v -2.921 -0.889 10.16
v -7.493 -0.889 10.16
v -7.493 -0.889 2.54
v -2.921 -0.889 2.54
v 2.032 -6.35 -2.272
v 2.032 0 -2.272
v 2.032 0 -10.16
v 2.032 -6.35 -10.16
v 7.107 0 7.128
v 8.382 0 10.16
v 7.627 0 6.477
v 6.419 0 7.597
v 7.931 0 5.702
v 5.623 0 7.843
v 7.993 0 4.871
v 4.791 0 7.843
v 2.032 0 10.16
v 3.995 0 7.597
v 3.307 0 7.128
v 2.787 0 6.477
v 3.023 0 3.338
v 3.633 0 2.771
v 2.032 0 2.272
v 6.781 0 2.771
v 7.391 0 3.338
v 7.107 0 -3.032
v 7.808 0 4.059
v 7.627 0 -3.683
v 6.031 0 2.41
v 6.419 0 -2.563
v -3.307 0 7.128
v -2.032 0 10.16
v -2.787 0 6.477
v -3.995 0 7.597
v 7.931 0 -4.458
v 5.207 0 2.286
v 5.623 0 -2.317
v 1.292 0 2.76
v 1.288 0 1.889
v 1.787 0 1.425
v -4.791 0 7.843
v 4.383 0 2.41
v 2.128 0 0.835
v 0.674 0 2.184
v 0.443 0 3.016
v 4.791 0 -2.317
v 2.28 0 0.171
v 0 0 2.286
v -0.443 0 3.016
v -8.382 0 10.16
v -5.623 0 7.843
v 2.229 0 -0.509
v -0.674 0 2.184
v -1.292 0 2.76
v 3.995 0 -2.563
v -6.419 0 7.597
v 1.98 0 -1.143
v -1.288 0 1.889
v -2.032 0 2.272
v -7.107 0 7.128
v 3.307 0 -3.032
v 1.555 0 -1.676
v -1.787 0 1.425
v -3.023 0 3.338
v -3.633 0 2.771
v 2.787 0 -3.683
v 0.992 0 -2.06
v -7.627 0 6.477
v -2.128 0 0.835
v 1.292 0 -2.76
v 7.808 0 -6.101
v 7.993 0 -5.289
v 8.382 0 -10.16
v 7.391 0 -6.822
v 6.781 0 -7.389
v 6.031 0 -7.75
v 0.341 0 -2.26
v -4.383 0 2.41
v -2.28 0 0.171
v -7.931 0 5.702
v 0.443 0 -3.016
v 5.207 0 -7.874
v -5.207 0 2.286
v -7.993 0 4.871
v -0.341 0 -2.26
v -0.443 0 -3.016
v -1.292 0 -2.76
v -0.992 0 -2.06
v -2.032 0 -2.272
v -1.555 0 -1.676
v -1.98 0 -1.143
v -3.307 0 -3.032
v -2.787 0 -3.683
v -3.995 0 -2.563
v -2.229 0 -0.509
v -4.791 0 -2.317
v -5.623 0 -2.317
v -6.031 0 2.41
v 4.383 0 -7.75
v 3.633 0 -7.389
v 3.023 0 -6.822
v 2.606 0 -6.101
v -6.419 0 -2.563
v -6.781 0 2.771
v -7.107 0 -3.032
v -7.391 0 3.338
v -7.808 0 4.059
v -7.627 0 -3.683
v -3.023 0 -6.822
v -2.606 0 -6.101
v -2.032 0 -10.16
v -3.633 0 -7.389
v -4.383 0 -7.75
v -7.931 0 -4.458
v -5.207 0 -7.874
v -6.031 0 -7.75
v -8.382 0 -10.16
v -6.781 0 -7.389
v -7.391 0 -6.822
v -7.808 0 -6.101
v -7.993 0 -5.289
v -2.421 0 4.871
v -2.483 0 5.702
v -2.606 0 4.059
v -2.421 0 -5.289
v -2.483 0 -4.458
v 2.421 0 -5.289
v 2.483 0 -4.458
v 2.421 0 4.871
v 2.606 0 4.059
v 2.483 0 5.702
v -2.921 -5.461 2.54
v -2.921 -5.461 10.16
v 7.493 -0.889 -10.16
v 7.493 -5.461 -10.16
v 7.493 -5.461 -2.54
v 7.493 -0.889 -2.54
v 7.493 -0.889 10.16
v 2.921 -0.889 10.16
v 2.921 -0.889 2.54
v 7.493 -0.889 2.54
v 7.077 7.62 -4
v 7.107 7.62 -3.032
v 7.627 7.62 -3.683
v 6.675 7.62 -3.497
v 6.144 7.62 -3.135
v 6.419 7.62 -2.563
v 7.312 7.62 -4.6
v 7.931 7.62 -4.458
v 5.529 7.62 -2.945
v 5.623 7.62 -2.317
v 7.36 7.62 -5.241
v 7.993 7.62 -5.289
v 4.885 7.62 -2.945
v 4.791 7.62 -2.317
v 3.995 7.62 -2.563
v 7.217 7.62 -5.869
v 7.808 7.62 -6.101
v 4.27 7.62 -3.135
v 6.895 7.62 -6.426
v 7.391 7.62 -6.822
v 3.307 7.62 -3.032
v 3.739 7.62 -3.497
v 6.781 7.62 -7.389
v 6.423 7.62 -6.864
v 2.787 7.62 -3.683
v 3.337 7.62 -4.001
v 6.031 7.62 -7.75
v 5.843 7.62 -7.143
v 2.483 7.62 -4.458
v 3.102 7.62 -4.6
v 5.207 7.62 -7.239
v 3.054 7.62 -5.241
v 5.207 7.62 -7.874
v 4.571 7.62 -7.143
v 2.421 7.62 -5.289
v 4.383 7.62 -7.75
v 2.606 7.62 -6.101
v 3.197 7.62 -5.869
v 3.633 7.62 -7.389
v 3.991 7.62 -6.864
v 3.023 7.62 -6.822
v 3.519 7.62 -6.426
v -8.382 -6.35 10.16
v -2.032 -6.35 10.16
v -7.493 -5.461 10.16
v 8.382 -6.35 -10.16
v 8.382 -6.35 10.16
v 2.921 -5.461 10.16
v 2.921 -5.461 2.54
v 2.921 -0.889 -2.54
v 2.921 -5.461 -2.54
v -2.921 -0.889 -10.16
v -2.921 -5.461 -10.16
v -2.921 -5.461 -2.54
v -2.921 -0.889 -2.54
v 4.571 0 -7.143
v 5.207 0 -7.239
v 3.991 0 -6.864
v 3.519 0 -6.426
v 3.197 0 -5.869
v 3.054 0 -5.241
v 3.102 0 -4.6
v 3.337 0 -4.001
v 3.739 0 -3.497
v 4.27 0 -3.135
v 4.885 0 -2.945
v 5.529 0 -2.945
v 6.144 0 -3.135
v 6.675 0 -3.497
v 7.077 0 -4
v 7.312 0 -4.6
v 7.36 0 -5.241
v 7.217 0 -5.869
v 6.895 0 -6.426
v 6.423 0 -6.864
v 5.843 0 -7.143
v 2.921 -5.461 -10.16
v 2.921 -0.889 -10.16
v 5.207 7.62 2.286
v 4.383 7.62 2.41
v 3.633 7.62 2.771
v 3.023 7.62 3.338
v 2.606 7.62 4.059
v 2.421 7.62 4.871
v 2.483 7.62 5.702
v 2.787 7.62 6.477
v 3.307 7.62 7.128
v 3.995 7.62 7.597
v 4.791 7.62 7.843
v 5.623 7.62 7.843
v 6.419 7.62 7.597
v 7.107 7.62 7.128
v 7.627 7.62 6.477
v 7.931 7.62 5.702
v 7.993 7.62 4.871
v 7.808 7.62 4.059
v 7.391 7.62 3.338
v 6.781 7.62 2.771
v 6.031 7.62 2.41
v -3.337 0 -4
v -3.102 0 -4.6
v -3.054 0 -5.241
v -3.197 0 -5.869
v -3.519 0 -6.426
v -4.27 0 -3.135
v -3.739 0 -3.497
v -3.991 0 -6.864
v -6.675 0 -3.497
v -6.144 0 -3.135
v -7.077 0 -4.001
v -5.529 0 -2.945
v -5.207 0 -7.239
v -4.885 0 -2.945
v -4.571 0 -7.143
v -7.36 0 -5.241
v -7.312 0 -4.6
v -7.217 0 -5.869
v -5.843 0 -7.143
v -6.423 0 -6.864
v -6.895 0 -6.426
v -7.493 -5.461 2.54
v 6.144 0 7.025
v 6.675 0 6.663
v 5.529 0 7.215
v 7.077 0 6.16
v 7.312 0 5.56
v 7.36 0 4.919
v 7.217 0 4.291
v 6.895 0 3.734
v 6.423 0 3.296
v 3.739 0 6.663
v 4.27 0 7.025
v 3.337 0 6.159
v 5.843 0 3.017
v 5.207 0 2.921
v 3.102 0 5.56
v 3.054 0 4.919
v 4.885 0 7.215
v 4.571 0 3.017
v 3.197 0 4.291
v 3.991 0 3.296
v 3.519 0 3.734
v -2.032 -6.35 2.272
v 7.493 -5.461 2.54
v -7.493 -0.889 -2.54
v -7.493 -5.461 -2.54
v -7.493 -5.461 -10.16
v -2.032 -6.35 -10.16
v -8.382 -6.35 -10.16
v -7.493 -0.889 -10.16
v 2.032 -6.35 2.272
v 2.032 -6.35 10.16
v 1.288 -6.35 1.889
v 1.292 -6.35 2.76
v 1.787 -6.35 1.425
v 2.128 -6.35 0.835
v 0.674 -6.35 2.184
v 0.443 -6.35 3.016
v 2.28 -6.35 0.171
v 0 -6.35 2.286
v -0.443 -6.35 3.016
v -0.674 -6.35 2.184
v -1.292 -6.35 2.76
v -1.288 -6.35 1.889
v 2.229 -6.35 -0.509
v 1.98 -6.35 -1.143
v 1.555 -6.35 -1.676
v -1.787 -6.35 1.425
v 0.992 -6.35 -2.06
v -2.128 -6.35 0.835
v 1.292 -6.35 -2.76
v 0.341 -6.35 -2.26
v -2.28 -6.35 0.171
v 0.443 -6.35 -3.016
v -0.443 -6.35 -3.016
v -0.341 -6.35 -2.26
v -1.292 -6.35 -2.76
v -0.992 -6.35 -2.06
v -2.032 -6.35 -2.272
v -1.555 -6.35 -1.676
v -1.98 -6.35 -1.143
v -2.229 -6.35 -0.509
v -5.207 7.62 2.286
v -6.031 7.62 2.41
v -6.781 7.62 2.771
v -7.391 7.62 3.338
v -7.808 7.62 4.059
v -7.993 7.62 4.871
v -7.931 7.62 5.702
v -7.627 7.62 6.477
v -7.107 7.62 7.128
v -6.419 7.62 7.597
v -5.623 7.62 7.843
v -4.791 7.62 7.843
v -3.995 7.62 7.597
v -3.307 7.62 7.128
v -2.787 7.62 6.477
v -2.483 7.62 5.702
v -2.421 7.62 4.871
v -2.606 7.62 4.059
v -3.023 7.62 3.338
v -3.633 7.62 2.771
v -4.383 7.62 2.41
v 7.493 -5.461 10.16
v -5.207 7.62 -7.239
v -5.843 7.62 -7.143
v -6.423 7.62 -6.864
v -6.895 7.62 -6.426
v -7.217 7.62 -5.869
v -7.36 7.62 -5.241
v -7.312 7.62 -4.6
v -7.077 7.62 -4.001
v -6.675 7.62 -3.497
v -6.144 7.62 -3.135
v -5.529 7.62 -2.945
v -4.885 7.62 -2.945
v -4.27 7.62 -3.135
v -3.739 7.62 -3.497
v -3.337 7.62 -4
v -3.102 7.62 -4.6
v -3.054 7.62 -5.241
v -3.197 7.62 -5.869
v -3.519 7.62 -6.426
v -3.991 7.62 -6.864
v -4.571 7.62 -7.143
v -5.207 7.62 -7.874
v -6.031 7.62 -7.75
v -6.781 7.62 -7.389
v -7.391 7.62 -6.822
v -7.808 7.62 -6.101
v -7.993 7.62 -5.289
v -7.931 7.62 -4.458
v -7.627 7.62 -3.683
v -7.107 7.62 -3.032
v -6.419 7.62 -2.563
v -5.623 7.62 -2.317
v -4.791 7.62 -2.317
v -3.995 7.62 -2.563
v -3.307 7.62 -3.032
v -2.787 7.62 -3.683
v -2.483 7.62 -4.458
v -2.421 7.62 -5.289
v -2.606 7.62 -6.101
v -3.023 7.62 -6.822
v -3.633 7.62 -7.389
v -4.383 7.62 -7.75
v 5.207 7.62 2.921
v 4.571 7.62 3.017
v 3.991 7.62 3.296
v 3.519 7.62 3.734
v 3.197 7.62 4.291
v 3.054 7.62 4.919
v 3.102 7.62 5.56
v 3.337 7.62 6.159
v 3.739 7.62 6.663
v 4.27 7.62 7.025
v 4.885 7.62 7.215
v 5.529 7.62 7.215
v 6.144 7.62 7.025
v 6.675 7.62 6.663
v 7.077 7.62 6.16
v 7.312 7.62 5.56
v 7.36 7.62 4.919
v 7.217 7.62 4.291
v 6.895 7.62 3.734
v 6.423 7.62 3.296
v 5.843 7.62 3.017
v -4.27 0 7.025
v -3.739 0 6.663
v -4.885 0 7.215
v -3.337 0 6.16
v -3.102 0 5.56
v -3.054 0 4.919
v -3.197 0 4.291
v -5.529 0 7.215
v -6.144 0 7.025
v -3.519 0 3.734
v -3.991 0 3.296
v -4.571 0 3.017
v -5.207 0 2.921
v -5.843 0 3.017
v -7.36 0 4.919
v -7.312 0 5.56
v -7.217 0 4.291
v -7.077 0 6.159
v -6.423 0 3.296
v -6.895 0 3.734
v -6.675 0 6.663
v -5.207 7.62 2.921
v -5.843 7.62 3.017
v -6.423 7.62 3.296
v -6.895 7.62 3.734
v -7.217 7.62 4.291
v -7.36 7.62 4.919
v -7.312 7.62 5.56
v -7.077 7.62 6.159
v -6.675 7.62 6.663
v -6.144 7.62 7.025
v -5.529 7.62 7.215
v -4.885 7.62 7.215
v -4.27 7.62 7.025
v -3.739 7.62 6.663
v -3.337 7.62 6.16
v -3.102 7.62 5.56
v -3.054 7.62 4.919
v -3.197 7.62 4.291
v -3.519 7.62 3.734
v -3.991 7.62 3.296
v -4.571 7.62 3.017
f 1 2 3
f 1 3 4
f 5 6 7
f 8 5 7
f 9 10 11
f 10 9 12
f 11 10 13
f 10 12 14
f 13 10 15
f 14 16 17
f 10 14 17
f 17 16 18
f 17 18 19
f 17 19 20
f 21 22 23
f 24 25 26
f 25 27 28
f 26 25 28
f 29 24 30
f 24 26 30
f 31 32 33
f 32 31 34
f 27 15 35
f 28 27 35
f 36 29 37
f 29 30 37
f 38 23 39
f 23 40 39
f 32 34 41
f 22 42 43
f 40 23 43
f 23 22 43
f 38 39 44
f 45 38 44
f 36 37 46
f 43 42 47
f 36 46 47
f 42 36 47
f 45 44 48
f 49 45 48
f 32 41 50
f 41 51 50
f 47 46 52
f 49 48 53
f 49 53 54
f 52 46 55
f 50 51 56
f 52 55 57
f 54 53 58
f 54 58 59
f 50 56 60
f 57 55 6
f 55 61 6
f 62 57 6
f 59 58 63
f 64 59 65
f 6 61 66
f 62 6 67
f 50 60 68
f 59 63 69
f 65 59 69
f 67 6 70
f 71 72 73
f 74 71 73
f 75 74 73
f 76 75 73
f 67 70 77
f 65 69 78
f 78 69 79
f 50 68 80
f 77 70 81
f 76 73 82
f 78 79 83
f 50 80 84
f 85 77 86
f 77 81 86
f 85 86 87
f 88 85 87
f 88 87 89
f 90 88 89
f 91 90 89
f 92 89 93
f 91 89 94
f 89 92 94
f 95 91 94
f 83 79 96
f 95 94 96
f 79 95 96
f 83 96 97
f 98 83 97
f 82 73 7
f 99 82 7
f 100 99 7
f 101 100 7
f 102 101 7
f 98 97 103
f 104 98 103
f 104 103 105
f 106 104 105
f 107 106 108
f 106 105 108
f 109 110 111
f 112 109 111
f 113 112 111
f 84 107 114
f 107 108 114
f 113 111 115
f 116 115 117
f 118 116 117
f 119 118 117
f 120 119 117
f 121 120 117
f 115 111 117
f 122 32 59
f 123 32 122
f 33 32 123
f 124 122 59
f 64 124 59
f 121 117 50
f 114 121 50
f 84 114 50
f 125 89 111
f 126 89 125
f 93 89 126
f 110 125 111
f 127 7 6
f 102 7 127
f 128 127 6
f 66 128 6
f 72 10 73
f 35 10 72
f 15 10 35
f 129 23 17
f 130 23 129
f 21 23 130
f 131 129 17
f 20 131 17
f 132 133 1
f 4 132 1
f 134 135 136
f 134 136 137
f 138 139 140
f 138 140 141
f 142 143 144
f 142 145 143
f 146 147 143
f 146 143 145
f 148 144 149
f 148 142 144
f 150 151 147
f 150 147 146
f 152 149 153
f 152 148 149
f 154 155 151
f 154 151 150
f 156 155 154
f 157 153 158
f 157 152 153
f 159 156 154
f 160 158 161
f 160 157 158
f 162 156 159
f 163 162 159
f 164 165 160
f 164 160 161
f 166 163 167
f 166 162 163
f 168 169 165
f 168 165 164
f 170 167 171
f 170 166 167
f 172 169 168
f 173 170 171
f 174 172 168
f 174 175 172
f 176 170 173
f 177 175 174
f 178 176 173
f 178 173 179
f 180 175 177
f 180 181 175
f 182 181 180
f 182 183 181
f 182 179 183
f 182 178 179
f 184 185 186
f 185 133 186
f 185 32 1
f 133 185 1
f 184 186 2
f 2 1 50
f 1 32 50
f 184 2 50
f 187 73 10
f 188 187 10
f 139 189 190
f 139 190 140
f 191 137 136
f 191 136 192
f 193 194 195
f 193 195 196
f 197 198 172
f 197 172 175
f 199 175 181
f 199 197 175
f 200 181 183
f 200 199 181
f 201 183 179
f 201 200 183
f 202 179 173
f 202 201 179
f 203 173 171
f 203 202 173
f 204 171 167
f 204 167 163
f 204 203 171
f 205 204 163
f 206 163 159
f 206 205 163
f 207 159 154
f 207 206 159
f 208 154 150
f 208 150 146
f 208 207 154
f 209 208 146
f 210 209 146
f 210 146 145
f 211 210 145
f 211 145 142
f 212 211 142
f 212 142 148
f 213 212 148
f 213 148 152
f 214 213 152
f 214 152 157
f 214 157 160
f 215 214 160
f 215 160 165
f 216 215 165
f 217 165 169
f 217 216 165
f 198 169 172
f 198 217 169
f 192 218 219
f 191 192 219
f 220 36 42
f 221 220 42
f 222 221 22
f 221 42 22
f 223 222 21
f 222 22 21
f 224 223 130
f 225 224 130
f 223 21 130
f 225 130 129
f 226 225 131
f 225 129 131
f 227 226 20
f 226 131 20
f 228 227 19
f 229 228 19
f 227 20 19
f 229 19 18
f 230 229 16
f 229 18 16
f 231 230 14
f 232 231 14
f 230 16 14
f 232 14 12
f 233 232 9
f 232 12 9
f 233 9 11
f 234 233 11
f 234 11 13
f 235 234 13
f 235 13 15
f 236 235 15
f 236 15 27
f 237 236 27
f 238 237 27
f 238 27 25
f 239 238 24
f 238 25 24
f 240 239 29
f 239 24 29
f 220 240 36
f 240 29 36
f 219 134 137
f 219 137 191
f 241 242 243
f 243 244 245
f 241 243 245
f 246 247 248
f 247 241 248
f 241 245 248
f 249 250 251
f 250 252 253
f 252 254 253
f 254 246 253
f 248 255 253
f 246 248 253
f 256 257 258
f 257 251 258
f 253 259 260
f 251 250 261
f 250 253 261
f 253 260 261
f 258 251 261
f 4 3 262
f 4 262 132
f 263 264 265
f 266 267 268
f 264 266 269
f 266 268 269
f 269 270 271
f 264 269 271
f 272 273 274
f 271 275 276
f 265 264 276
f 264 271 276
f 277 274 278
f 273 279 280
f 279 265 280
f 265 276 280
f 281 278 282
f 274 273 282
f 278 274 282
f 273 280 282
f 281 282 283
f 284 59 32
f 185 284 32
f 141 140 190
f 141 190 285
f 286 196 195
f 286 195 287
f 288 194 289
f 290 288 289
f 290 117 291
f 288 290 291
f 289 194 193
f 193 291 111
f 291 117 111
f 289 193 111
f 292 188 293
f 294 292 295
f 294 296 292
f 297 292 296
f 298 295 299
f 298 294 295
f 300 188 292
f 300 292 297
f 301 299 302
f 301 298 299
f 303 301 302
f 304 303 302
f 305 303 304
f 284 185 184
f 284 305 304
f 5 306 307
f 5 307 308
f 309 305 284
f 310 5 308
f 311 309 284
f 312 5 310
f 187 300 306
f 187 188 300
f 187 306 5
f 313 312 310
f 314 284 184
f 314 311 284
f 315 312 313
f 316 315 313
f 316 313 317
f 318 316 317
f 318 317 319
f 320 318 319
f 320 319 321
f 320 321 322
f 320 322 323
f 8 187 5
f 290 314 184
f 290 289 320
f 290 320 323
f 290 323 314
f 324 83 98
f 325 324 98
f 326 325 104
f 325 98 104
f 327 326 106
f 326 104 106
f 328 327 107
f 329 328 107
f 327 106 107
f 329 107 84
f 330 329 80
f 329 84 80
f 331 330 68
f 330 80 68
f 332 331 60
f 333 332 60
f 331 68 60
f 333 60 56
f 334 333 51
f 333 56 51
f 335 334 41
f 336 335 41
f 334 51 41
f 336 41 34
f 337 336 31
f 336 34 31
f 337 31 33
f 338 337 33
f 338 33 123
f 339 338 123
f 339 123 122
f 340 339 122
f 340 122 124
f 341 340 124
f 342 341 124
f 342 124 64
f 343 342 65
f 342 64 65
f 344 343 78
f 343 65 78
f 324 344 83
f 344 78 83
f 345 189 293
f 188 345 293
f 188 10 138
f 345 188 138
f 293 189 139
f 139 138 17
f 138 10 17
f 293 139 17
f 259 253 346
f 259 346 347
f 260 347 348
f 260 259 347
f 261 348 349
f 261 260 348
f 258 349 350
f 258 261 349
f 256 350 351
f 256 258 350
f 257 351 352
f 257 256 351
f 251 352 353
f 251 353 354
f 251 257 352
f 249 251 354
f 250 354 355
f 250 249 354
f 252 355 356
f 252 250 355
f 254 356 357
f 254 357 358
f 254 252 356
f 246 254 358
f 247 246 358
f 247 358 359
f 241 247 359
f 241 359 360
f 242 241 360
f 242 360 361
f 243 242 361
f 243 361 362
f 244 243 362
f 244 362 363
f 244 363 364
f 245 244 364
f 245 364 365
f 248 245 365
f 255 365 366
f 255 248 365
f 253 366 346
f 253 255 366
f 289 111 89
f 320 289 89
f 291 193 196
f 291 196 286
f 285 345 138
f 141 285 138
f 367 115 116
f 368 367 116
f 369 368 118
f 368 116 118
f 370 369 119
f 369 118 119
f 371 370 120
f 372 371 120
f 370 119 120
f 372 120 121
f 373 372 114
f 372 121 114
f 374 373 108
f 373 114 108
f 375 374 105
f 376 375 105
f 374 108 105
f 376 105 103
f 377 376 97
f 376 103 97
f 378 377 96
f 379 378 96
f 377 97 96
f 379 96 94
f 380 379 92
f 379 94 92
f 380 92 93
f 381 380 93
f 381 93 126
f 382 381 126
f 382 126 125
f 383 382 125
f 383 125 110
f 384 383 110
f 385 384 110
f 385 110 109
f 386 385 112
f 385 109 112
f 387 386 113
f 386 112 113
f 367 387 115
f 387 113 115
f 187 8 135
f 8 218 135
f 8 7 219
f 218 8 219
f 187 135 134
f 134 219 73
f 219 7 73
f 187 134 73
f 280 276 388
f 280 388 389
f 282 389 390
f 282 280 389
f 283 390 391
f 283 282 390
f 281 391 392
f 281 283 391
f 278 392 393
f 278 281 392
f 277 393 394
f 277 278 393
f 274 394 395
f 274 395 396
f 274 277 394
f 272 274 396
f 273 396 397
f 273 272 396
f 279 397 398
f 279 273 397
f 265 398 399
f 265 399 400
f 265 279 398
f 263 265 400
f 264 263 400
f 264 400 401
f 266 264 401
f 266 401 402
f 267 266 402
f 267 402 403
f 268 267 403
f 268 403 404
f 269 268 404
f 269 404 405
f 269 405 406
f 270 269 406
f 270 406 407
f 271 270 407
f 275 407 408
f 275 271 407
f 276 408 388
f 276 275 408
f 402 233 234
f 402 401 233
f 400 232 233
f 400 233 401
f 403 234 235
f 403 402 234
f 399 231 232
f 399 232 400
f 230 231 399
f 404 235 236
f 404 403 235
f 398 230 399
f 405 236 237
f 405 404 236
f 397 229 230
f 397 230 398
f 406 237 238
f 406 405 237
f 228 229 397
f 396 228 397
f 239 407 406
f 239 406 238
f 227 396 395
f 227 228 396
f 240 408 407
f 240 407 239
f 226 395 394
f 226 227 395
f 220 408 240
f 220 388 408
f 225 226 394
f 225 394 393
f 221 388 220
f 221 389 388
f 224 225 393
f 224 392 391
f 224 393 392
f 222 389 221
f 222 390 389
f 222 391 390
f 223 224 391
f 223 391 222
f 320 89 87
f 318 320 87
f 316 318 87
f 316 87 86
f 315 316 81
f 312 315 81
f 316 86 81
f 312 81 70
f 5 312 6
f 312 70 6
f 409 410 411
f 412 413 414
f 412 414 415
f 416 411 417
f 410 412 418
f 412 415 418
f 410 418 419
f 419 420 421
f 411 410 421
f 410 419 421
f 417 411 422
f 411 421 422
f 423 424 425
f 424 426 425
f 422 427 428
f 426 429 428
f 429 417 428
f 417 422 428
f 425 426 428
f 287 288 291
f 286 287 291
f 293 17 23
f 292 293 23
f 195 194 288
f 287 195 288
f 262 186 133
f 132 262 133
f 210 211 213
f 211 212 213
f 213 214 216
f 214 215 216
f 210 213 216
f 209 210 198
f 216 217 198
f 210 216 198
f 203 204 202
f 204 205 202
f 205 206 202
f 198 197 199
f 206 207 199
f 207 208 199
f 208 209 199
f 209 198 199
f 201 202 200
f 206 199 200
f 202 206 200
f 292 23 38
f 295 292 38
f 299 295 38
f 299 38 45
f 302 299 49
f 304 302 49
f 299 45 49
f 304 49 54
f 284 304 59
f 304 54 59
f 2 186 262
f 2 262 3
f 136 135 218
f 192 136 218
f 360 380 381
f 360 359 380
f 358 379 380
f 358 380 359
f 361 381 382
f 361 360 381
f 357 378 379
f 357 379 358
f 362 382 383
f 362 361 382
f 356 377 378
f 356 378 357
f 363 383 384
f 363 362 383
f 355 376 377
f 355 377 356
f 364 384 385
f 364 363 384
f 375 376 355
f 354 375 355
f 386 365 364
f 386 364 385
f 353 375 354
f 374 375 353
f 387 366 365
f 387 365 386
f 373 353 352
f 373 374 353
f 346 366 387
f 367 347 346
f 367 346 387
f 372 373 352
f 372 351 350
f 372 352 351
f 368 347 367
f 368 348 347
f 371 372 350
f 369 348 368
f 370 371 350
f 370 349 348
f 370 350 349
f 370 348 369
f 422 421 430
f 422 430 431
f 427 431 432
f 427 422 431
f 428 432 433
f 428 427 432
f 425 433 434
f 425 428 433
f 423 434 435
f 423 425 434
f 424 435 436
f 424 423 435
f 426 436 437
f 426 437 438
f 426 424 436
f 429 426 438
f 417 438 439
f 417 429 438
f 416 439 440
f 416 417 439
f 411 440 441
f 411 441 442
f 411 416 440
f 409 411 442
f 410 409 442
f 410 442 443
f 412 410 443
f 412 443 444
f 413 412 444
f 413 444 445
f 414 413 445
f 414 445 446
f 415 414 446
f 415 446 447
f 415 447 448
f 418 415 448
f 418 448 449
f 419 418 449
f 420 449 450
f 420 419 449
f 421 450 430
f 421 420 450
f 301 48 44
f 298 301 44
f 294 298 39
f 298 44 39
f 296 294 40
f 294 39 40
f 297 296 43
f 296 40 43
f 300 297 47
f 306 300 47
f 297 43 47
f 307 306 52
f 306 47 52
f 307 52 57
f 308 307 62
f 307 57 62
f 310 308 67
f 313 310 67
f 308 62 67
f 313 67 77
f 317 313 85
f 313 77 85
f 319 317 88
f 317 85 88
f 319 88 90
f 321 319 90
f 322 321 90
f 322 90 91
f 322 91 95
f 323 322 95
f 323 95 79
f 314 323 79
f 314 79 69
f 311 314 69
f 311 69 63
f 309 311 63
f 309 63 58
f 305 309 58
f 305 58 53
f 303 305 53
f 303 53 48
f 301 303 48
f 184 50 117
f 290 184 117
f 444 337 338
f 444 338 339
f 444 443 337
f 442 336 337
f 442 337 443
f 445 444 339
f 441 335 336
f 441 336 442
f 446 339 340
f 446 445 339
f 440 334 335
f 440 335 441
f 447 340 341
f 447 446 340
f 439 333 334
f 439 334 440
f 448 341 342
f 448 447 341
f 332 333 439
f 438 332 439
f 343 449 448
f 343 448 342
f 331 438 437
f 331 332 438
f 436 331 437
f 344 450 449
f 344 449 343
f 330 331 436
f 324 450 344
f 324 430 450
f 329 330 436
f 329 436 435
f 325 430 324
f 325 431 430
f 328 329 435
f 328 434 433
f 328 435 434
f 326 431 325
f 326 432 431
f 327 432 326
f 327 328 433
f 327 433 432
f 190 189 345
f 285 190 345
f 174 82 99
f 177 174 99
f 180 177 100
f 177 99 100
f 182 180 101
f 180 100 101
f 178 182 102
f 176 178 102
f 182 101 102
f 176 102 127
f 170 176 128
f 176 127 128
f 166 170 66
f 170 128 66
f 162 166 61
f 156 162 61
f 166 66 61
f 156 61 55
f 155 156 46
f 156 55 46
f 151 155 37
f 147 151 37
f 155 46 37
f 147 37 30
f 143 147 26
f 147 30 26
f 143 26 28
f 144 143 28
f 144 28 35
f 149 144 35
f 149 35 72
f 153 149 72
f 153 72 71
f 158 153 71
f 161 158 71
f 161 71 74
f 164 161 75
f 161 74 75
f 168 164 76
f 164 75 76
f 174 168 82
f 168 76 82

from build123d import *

# Parameters (mm, degrees)
BOSS_EXTRUDE1_DEPTH = 6.35
SKETCH2_R           = 2.286
CUT_EXTRUDE1_DEPTH  = 15.622107372
SKETCH3_W           = 4.572
SKETCH3_H           = 4.572
CUT_EXTRUDE2_DEPTH  = 7.62
SKETCH4_W           = 4.572
SKETCH4_H           = 4.572
CUT_EXTRUDE3_DEPTH  = 7.62
SKETCH5_R           = 2.794
SKETCH5_R_2         = 2.159
BOSS_EXTRUDE2_DEPTH = 7.62


with BuildPart() as part:
    # Sketch1 → Boss-Extrude1 (new body)
    with BuildSketch(Plane(origin=(0, 0, 0), x_dir=(1, 0, 0), z_dir=(0, 1, 0))):
        with BuildLine():
            Line((-2.032, -2.271845065), (-2.032, -10.16))
            Line((-2.032, -10.16), (-8.382, -10.16))
            Line((-8.382, -10.16), (-8.382, 10.16))
            Line((-8.382, 10.16), (-2.032, 10.16))
            Line((-2.032, 10.16), (-2.032, 2.271845065))
            ThreePointArc((-2.032, 2.271845065), (0, 3.048), (2.032, 2.271845065))
            Line((2.032, 2.271845065), (2.032, 10.16))
            Line((2.032, 10.16), (8.382, 10.16))
            Line((8.382, 10.16), (8.382, -10.16))
            Line((8.382, -10.16), (2.032, -10.16))
            Line((2.032, -10.16), (2.032, -2.271845065))
            ThreePointArc((2.032, -2.271845065), (0, -3.048), (-2.032, -2.271845065))
        make_face()
    extrude(amount=-BOSS_EXTRUDE1_DEPTH)

    # Sketch2 → Cut-Extrude1 (cut, through all)
    with BuildSketch(Plane(origin=(0, 0, 0), x_dir=(1, 0, 0), z_dir=(0, 1, 0))):
        with Locations(Location((0, 0, 0), (0, 0, 270))):
            Circle(SKETCH2_R)
    extrude(amount=-CUT_EXTRUDE1_DEPTH, mode=Mode.SUBTRACT)

    # Sketch3 → Cut-Extrude2 (cut)
    with BuildSketch(Plane.XY.offset(10.16)):
        with Locations((-5.207, -3.175)):
            Rectangle(SKETCH3_W, SKETCH3_H)
        with Locations((5.207, -3.175)):
            Rectangle(SKETCH3_W, SKETCH3_H)
    extrude(amount=-CUT_EXTRUDE2_DEPTH, mode=Mode.SUBTRACT)

    # Sketch4 → Cut-Extrude3 (cut)
    with BuildSketch(Plane(origin=(0, 0, -10.16), x_dir=(-1, 0, 0), z_dir=(0, 0, -1))):
        with Locations((-5.207, -3.175)):
            Rectangle(SKETCH4_W, SKETCH4_H)
        with Locations((5.207, -3.175)):
            Rectangle(SKETCH4_W, SKETCH4_H)
    extrude(amount=-CUT_EXTRUDE3_DEPTH, mode=Mode.SUBTRACT)

    # Sketch5 → Boss-Extrude2 (add)
    # profile 1 of 4: a face of its own
    with BuildSketch(Plane(origin=(0, 0, 0), x_dir=(1, 0, 0), z_dir=(0, 1, 0))):
        with Locations(Location((-5.207, -5.08, 0), (0, 0, 90))):
            Circle(SKETCH5_R)
        with Locations(Location((-5.207, -5.08, 0), (0, 0, 90))):
            Circle(SKETCH5_R_2, mode=Mode.SUBTRACT)
    # profile 2 of 4: a face of its own
    with BuildSketch(Plane(origin=(0, 0, 0), x_dir=(1, 0, 0), z_dir=(0, 1, 0))):
        with Locations(Location((-5.207, 5.08, 0), (0, 0, 90))):
            Circle(SKETCH5_R)
        with Locations(Location((-5.207, 5.08, 0), (0, 0, 90))):
            Circle(SKETCH5_R_2, mode=Mode.SUBTRACT)
    # profile 3 of 4: a face of its own
    with BuildSketch(Plane(origin=(0, 0, 0), x_dir=(1, 0, 0), z_dir=(0, 1, 0))):
        with Locations(Location((5.207, 5.08, 0), (0, 0, 90))):
            Circle(SKETCH5_R)
        with Locations(Location((5.207, 5.08, 0), (0, 0, 90))):
            Circle(SKETCH5_R_2, mode=Mode.SUBTRACT)
    # profile 4 of 4: a face of its own
    with BuildSketch(Plane(origin=(0, 0, 0), x_dir=(1, 0, 0), z_dir=(0, 1, 0))):
        with Locations(Location((5.207, -5.08, 0), (0, 0, 90))):
            Circle(SKETCH5_R)
        with Locations(Location((5.207, -5.08, 0), (0, 0, 90))):
            Circle(SKETCH5_R_2, mode=Mode.SUBTRACT)
    extrude(amount=BOSS_EXTRUDE2_DEPTH)


solid = part.part
